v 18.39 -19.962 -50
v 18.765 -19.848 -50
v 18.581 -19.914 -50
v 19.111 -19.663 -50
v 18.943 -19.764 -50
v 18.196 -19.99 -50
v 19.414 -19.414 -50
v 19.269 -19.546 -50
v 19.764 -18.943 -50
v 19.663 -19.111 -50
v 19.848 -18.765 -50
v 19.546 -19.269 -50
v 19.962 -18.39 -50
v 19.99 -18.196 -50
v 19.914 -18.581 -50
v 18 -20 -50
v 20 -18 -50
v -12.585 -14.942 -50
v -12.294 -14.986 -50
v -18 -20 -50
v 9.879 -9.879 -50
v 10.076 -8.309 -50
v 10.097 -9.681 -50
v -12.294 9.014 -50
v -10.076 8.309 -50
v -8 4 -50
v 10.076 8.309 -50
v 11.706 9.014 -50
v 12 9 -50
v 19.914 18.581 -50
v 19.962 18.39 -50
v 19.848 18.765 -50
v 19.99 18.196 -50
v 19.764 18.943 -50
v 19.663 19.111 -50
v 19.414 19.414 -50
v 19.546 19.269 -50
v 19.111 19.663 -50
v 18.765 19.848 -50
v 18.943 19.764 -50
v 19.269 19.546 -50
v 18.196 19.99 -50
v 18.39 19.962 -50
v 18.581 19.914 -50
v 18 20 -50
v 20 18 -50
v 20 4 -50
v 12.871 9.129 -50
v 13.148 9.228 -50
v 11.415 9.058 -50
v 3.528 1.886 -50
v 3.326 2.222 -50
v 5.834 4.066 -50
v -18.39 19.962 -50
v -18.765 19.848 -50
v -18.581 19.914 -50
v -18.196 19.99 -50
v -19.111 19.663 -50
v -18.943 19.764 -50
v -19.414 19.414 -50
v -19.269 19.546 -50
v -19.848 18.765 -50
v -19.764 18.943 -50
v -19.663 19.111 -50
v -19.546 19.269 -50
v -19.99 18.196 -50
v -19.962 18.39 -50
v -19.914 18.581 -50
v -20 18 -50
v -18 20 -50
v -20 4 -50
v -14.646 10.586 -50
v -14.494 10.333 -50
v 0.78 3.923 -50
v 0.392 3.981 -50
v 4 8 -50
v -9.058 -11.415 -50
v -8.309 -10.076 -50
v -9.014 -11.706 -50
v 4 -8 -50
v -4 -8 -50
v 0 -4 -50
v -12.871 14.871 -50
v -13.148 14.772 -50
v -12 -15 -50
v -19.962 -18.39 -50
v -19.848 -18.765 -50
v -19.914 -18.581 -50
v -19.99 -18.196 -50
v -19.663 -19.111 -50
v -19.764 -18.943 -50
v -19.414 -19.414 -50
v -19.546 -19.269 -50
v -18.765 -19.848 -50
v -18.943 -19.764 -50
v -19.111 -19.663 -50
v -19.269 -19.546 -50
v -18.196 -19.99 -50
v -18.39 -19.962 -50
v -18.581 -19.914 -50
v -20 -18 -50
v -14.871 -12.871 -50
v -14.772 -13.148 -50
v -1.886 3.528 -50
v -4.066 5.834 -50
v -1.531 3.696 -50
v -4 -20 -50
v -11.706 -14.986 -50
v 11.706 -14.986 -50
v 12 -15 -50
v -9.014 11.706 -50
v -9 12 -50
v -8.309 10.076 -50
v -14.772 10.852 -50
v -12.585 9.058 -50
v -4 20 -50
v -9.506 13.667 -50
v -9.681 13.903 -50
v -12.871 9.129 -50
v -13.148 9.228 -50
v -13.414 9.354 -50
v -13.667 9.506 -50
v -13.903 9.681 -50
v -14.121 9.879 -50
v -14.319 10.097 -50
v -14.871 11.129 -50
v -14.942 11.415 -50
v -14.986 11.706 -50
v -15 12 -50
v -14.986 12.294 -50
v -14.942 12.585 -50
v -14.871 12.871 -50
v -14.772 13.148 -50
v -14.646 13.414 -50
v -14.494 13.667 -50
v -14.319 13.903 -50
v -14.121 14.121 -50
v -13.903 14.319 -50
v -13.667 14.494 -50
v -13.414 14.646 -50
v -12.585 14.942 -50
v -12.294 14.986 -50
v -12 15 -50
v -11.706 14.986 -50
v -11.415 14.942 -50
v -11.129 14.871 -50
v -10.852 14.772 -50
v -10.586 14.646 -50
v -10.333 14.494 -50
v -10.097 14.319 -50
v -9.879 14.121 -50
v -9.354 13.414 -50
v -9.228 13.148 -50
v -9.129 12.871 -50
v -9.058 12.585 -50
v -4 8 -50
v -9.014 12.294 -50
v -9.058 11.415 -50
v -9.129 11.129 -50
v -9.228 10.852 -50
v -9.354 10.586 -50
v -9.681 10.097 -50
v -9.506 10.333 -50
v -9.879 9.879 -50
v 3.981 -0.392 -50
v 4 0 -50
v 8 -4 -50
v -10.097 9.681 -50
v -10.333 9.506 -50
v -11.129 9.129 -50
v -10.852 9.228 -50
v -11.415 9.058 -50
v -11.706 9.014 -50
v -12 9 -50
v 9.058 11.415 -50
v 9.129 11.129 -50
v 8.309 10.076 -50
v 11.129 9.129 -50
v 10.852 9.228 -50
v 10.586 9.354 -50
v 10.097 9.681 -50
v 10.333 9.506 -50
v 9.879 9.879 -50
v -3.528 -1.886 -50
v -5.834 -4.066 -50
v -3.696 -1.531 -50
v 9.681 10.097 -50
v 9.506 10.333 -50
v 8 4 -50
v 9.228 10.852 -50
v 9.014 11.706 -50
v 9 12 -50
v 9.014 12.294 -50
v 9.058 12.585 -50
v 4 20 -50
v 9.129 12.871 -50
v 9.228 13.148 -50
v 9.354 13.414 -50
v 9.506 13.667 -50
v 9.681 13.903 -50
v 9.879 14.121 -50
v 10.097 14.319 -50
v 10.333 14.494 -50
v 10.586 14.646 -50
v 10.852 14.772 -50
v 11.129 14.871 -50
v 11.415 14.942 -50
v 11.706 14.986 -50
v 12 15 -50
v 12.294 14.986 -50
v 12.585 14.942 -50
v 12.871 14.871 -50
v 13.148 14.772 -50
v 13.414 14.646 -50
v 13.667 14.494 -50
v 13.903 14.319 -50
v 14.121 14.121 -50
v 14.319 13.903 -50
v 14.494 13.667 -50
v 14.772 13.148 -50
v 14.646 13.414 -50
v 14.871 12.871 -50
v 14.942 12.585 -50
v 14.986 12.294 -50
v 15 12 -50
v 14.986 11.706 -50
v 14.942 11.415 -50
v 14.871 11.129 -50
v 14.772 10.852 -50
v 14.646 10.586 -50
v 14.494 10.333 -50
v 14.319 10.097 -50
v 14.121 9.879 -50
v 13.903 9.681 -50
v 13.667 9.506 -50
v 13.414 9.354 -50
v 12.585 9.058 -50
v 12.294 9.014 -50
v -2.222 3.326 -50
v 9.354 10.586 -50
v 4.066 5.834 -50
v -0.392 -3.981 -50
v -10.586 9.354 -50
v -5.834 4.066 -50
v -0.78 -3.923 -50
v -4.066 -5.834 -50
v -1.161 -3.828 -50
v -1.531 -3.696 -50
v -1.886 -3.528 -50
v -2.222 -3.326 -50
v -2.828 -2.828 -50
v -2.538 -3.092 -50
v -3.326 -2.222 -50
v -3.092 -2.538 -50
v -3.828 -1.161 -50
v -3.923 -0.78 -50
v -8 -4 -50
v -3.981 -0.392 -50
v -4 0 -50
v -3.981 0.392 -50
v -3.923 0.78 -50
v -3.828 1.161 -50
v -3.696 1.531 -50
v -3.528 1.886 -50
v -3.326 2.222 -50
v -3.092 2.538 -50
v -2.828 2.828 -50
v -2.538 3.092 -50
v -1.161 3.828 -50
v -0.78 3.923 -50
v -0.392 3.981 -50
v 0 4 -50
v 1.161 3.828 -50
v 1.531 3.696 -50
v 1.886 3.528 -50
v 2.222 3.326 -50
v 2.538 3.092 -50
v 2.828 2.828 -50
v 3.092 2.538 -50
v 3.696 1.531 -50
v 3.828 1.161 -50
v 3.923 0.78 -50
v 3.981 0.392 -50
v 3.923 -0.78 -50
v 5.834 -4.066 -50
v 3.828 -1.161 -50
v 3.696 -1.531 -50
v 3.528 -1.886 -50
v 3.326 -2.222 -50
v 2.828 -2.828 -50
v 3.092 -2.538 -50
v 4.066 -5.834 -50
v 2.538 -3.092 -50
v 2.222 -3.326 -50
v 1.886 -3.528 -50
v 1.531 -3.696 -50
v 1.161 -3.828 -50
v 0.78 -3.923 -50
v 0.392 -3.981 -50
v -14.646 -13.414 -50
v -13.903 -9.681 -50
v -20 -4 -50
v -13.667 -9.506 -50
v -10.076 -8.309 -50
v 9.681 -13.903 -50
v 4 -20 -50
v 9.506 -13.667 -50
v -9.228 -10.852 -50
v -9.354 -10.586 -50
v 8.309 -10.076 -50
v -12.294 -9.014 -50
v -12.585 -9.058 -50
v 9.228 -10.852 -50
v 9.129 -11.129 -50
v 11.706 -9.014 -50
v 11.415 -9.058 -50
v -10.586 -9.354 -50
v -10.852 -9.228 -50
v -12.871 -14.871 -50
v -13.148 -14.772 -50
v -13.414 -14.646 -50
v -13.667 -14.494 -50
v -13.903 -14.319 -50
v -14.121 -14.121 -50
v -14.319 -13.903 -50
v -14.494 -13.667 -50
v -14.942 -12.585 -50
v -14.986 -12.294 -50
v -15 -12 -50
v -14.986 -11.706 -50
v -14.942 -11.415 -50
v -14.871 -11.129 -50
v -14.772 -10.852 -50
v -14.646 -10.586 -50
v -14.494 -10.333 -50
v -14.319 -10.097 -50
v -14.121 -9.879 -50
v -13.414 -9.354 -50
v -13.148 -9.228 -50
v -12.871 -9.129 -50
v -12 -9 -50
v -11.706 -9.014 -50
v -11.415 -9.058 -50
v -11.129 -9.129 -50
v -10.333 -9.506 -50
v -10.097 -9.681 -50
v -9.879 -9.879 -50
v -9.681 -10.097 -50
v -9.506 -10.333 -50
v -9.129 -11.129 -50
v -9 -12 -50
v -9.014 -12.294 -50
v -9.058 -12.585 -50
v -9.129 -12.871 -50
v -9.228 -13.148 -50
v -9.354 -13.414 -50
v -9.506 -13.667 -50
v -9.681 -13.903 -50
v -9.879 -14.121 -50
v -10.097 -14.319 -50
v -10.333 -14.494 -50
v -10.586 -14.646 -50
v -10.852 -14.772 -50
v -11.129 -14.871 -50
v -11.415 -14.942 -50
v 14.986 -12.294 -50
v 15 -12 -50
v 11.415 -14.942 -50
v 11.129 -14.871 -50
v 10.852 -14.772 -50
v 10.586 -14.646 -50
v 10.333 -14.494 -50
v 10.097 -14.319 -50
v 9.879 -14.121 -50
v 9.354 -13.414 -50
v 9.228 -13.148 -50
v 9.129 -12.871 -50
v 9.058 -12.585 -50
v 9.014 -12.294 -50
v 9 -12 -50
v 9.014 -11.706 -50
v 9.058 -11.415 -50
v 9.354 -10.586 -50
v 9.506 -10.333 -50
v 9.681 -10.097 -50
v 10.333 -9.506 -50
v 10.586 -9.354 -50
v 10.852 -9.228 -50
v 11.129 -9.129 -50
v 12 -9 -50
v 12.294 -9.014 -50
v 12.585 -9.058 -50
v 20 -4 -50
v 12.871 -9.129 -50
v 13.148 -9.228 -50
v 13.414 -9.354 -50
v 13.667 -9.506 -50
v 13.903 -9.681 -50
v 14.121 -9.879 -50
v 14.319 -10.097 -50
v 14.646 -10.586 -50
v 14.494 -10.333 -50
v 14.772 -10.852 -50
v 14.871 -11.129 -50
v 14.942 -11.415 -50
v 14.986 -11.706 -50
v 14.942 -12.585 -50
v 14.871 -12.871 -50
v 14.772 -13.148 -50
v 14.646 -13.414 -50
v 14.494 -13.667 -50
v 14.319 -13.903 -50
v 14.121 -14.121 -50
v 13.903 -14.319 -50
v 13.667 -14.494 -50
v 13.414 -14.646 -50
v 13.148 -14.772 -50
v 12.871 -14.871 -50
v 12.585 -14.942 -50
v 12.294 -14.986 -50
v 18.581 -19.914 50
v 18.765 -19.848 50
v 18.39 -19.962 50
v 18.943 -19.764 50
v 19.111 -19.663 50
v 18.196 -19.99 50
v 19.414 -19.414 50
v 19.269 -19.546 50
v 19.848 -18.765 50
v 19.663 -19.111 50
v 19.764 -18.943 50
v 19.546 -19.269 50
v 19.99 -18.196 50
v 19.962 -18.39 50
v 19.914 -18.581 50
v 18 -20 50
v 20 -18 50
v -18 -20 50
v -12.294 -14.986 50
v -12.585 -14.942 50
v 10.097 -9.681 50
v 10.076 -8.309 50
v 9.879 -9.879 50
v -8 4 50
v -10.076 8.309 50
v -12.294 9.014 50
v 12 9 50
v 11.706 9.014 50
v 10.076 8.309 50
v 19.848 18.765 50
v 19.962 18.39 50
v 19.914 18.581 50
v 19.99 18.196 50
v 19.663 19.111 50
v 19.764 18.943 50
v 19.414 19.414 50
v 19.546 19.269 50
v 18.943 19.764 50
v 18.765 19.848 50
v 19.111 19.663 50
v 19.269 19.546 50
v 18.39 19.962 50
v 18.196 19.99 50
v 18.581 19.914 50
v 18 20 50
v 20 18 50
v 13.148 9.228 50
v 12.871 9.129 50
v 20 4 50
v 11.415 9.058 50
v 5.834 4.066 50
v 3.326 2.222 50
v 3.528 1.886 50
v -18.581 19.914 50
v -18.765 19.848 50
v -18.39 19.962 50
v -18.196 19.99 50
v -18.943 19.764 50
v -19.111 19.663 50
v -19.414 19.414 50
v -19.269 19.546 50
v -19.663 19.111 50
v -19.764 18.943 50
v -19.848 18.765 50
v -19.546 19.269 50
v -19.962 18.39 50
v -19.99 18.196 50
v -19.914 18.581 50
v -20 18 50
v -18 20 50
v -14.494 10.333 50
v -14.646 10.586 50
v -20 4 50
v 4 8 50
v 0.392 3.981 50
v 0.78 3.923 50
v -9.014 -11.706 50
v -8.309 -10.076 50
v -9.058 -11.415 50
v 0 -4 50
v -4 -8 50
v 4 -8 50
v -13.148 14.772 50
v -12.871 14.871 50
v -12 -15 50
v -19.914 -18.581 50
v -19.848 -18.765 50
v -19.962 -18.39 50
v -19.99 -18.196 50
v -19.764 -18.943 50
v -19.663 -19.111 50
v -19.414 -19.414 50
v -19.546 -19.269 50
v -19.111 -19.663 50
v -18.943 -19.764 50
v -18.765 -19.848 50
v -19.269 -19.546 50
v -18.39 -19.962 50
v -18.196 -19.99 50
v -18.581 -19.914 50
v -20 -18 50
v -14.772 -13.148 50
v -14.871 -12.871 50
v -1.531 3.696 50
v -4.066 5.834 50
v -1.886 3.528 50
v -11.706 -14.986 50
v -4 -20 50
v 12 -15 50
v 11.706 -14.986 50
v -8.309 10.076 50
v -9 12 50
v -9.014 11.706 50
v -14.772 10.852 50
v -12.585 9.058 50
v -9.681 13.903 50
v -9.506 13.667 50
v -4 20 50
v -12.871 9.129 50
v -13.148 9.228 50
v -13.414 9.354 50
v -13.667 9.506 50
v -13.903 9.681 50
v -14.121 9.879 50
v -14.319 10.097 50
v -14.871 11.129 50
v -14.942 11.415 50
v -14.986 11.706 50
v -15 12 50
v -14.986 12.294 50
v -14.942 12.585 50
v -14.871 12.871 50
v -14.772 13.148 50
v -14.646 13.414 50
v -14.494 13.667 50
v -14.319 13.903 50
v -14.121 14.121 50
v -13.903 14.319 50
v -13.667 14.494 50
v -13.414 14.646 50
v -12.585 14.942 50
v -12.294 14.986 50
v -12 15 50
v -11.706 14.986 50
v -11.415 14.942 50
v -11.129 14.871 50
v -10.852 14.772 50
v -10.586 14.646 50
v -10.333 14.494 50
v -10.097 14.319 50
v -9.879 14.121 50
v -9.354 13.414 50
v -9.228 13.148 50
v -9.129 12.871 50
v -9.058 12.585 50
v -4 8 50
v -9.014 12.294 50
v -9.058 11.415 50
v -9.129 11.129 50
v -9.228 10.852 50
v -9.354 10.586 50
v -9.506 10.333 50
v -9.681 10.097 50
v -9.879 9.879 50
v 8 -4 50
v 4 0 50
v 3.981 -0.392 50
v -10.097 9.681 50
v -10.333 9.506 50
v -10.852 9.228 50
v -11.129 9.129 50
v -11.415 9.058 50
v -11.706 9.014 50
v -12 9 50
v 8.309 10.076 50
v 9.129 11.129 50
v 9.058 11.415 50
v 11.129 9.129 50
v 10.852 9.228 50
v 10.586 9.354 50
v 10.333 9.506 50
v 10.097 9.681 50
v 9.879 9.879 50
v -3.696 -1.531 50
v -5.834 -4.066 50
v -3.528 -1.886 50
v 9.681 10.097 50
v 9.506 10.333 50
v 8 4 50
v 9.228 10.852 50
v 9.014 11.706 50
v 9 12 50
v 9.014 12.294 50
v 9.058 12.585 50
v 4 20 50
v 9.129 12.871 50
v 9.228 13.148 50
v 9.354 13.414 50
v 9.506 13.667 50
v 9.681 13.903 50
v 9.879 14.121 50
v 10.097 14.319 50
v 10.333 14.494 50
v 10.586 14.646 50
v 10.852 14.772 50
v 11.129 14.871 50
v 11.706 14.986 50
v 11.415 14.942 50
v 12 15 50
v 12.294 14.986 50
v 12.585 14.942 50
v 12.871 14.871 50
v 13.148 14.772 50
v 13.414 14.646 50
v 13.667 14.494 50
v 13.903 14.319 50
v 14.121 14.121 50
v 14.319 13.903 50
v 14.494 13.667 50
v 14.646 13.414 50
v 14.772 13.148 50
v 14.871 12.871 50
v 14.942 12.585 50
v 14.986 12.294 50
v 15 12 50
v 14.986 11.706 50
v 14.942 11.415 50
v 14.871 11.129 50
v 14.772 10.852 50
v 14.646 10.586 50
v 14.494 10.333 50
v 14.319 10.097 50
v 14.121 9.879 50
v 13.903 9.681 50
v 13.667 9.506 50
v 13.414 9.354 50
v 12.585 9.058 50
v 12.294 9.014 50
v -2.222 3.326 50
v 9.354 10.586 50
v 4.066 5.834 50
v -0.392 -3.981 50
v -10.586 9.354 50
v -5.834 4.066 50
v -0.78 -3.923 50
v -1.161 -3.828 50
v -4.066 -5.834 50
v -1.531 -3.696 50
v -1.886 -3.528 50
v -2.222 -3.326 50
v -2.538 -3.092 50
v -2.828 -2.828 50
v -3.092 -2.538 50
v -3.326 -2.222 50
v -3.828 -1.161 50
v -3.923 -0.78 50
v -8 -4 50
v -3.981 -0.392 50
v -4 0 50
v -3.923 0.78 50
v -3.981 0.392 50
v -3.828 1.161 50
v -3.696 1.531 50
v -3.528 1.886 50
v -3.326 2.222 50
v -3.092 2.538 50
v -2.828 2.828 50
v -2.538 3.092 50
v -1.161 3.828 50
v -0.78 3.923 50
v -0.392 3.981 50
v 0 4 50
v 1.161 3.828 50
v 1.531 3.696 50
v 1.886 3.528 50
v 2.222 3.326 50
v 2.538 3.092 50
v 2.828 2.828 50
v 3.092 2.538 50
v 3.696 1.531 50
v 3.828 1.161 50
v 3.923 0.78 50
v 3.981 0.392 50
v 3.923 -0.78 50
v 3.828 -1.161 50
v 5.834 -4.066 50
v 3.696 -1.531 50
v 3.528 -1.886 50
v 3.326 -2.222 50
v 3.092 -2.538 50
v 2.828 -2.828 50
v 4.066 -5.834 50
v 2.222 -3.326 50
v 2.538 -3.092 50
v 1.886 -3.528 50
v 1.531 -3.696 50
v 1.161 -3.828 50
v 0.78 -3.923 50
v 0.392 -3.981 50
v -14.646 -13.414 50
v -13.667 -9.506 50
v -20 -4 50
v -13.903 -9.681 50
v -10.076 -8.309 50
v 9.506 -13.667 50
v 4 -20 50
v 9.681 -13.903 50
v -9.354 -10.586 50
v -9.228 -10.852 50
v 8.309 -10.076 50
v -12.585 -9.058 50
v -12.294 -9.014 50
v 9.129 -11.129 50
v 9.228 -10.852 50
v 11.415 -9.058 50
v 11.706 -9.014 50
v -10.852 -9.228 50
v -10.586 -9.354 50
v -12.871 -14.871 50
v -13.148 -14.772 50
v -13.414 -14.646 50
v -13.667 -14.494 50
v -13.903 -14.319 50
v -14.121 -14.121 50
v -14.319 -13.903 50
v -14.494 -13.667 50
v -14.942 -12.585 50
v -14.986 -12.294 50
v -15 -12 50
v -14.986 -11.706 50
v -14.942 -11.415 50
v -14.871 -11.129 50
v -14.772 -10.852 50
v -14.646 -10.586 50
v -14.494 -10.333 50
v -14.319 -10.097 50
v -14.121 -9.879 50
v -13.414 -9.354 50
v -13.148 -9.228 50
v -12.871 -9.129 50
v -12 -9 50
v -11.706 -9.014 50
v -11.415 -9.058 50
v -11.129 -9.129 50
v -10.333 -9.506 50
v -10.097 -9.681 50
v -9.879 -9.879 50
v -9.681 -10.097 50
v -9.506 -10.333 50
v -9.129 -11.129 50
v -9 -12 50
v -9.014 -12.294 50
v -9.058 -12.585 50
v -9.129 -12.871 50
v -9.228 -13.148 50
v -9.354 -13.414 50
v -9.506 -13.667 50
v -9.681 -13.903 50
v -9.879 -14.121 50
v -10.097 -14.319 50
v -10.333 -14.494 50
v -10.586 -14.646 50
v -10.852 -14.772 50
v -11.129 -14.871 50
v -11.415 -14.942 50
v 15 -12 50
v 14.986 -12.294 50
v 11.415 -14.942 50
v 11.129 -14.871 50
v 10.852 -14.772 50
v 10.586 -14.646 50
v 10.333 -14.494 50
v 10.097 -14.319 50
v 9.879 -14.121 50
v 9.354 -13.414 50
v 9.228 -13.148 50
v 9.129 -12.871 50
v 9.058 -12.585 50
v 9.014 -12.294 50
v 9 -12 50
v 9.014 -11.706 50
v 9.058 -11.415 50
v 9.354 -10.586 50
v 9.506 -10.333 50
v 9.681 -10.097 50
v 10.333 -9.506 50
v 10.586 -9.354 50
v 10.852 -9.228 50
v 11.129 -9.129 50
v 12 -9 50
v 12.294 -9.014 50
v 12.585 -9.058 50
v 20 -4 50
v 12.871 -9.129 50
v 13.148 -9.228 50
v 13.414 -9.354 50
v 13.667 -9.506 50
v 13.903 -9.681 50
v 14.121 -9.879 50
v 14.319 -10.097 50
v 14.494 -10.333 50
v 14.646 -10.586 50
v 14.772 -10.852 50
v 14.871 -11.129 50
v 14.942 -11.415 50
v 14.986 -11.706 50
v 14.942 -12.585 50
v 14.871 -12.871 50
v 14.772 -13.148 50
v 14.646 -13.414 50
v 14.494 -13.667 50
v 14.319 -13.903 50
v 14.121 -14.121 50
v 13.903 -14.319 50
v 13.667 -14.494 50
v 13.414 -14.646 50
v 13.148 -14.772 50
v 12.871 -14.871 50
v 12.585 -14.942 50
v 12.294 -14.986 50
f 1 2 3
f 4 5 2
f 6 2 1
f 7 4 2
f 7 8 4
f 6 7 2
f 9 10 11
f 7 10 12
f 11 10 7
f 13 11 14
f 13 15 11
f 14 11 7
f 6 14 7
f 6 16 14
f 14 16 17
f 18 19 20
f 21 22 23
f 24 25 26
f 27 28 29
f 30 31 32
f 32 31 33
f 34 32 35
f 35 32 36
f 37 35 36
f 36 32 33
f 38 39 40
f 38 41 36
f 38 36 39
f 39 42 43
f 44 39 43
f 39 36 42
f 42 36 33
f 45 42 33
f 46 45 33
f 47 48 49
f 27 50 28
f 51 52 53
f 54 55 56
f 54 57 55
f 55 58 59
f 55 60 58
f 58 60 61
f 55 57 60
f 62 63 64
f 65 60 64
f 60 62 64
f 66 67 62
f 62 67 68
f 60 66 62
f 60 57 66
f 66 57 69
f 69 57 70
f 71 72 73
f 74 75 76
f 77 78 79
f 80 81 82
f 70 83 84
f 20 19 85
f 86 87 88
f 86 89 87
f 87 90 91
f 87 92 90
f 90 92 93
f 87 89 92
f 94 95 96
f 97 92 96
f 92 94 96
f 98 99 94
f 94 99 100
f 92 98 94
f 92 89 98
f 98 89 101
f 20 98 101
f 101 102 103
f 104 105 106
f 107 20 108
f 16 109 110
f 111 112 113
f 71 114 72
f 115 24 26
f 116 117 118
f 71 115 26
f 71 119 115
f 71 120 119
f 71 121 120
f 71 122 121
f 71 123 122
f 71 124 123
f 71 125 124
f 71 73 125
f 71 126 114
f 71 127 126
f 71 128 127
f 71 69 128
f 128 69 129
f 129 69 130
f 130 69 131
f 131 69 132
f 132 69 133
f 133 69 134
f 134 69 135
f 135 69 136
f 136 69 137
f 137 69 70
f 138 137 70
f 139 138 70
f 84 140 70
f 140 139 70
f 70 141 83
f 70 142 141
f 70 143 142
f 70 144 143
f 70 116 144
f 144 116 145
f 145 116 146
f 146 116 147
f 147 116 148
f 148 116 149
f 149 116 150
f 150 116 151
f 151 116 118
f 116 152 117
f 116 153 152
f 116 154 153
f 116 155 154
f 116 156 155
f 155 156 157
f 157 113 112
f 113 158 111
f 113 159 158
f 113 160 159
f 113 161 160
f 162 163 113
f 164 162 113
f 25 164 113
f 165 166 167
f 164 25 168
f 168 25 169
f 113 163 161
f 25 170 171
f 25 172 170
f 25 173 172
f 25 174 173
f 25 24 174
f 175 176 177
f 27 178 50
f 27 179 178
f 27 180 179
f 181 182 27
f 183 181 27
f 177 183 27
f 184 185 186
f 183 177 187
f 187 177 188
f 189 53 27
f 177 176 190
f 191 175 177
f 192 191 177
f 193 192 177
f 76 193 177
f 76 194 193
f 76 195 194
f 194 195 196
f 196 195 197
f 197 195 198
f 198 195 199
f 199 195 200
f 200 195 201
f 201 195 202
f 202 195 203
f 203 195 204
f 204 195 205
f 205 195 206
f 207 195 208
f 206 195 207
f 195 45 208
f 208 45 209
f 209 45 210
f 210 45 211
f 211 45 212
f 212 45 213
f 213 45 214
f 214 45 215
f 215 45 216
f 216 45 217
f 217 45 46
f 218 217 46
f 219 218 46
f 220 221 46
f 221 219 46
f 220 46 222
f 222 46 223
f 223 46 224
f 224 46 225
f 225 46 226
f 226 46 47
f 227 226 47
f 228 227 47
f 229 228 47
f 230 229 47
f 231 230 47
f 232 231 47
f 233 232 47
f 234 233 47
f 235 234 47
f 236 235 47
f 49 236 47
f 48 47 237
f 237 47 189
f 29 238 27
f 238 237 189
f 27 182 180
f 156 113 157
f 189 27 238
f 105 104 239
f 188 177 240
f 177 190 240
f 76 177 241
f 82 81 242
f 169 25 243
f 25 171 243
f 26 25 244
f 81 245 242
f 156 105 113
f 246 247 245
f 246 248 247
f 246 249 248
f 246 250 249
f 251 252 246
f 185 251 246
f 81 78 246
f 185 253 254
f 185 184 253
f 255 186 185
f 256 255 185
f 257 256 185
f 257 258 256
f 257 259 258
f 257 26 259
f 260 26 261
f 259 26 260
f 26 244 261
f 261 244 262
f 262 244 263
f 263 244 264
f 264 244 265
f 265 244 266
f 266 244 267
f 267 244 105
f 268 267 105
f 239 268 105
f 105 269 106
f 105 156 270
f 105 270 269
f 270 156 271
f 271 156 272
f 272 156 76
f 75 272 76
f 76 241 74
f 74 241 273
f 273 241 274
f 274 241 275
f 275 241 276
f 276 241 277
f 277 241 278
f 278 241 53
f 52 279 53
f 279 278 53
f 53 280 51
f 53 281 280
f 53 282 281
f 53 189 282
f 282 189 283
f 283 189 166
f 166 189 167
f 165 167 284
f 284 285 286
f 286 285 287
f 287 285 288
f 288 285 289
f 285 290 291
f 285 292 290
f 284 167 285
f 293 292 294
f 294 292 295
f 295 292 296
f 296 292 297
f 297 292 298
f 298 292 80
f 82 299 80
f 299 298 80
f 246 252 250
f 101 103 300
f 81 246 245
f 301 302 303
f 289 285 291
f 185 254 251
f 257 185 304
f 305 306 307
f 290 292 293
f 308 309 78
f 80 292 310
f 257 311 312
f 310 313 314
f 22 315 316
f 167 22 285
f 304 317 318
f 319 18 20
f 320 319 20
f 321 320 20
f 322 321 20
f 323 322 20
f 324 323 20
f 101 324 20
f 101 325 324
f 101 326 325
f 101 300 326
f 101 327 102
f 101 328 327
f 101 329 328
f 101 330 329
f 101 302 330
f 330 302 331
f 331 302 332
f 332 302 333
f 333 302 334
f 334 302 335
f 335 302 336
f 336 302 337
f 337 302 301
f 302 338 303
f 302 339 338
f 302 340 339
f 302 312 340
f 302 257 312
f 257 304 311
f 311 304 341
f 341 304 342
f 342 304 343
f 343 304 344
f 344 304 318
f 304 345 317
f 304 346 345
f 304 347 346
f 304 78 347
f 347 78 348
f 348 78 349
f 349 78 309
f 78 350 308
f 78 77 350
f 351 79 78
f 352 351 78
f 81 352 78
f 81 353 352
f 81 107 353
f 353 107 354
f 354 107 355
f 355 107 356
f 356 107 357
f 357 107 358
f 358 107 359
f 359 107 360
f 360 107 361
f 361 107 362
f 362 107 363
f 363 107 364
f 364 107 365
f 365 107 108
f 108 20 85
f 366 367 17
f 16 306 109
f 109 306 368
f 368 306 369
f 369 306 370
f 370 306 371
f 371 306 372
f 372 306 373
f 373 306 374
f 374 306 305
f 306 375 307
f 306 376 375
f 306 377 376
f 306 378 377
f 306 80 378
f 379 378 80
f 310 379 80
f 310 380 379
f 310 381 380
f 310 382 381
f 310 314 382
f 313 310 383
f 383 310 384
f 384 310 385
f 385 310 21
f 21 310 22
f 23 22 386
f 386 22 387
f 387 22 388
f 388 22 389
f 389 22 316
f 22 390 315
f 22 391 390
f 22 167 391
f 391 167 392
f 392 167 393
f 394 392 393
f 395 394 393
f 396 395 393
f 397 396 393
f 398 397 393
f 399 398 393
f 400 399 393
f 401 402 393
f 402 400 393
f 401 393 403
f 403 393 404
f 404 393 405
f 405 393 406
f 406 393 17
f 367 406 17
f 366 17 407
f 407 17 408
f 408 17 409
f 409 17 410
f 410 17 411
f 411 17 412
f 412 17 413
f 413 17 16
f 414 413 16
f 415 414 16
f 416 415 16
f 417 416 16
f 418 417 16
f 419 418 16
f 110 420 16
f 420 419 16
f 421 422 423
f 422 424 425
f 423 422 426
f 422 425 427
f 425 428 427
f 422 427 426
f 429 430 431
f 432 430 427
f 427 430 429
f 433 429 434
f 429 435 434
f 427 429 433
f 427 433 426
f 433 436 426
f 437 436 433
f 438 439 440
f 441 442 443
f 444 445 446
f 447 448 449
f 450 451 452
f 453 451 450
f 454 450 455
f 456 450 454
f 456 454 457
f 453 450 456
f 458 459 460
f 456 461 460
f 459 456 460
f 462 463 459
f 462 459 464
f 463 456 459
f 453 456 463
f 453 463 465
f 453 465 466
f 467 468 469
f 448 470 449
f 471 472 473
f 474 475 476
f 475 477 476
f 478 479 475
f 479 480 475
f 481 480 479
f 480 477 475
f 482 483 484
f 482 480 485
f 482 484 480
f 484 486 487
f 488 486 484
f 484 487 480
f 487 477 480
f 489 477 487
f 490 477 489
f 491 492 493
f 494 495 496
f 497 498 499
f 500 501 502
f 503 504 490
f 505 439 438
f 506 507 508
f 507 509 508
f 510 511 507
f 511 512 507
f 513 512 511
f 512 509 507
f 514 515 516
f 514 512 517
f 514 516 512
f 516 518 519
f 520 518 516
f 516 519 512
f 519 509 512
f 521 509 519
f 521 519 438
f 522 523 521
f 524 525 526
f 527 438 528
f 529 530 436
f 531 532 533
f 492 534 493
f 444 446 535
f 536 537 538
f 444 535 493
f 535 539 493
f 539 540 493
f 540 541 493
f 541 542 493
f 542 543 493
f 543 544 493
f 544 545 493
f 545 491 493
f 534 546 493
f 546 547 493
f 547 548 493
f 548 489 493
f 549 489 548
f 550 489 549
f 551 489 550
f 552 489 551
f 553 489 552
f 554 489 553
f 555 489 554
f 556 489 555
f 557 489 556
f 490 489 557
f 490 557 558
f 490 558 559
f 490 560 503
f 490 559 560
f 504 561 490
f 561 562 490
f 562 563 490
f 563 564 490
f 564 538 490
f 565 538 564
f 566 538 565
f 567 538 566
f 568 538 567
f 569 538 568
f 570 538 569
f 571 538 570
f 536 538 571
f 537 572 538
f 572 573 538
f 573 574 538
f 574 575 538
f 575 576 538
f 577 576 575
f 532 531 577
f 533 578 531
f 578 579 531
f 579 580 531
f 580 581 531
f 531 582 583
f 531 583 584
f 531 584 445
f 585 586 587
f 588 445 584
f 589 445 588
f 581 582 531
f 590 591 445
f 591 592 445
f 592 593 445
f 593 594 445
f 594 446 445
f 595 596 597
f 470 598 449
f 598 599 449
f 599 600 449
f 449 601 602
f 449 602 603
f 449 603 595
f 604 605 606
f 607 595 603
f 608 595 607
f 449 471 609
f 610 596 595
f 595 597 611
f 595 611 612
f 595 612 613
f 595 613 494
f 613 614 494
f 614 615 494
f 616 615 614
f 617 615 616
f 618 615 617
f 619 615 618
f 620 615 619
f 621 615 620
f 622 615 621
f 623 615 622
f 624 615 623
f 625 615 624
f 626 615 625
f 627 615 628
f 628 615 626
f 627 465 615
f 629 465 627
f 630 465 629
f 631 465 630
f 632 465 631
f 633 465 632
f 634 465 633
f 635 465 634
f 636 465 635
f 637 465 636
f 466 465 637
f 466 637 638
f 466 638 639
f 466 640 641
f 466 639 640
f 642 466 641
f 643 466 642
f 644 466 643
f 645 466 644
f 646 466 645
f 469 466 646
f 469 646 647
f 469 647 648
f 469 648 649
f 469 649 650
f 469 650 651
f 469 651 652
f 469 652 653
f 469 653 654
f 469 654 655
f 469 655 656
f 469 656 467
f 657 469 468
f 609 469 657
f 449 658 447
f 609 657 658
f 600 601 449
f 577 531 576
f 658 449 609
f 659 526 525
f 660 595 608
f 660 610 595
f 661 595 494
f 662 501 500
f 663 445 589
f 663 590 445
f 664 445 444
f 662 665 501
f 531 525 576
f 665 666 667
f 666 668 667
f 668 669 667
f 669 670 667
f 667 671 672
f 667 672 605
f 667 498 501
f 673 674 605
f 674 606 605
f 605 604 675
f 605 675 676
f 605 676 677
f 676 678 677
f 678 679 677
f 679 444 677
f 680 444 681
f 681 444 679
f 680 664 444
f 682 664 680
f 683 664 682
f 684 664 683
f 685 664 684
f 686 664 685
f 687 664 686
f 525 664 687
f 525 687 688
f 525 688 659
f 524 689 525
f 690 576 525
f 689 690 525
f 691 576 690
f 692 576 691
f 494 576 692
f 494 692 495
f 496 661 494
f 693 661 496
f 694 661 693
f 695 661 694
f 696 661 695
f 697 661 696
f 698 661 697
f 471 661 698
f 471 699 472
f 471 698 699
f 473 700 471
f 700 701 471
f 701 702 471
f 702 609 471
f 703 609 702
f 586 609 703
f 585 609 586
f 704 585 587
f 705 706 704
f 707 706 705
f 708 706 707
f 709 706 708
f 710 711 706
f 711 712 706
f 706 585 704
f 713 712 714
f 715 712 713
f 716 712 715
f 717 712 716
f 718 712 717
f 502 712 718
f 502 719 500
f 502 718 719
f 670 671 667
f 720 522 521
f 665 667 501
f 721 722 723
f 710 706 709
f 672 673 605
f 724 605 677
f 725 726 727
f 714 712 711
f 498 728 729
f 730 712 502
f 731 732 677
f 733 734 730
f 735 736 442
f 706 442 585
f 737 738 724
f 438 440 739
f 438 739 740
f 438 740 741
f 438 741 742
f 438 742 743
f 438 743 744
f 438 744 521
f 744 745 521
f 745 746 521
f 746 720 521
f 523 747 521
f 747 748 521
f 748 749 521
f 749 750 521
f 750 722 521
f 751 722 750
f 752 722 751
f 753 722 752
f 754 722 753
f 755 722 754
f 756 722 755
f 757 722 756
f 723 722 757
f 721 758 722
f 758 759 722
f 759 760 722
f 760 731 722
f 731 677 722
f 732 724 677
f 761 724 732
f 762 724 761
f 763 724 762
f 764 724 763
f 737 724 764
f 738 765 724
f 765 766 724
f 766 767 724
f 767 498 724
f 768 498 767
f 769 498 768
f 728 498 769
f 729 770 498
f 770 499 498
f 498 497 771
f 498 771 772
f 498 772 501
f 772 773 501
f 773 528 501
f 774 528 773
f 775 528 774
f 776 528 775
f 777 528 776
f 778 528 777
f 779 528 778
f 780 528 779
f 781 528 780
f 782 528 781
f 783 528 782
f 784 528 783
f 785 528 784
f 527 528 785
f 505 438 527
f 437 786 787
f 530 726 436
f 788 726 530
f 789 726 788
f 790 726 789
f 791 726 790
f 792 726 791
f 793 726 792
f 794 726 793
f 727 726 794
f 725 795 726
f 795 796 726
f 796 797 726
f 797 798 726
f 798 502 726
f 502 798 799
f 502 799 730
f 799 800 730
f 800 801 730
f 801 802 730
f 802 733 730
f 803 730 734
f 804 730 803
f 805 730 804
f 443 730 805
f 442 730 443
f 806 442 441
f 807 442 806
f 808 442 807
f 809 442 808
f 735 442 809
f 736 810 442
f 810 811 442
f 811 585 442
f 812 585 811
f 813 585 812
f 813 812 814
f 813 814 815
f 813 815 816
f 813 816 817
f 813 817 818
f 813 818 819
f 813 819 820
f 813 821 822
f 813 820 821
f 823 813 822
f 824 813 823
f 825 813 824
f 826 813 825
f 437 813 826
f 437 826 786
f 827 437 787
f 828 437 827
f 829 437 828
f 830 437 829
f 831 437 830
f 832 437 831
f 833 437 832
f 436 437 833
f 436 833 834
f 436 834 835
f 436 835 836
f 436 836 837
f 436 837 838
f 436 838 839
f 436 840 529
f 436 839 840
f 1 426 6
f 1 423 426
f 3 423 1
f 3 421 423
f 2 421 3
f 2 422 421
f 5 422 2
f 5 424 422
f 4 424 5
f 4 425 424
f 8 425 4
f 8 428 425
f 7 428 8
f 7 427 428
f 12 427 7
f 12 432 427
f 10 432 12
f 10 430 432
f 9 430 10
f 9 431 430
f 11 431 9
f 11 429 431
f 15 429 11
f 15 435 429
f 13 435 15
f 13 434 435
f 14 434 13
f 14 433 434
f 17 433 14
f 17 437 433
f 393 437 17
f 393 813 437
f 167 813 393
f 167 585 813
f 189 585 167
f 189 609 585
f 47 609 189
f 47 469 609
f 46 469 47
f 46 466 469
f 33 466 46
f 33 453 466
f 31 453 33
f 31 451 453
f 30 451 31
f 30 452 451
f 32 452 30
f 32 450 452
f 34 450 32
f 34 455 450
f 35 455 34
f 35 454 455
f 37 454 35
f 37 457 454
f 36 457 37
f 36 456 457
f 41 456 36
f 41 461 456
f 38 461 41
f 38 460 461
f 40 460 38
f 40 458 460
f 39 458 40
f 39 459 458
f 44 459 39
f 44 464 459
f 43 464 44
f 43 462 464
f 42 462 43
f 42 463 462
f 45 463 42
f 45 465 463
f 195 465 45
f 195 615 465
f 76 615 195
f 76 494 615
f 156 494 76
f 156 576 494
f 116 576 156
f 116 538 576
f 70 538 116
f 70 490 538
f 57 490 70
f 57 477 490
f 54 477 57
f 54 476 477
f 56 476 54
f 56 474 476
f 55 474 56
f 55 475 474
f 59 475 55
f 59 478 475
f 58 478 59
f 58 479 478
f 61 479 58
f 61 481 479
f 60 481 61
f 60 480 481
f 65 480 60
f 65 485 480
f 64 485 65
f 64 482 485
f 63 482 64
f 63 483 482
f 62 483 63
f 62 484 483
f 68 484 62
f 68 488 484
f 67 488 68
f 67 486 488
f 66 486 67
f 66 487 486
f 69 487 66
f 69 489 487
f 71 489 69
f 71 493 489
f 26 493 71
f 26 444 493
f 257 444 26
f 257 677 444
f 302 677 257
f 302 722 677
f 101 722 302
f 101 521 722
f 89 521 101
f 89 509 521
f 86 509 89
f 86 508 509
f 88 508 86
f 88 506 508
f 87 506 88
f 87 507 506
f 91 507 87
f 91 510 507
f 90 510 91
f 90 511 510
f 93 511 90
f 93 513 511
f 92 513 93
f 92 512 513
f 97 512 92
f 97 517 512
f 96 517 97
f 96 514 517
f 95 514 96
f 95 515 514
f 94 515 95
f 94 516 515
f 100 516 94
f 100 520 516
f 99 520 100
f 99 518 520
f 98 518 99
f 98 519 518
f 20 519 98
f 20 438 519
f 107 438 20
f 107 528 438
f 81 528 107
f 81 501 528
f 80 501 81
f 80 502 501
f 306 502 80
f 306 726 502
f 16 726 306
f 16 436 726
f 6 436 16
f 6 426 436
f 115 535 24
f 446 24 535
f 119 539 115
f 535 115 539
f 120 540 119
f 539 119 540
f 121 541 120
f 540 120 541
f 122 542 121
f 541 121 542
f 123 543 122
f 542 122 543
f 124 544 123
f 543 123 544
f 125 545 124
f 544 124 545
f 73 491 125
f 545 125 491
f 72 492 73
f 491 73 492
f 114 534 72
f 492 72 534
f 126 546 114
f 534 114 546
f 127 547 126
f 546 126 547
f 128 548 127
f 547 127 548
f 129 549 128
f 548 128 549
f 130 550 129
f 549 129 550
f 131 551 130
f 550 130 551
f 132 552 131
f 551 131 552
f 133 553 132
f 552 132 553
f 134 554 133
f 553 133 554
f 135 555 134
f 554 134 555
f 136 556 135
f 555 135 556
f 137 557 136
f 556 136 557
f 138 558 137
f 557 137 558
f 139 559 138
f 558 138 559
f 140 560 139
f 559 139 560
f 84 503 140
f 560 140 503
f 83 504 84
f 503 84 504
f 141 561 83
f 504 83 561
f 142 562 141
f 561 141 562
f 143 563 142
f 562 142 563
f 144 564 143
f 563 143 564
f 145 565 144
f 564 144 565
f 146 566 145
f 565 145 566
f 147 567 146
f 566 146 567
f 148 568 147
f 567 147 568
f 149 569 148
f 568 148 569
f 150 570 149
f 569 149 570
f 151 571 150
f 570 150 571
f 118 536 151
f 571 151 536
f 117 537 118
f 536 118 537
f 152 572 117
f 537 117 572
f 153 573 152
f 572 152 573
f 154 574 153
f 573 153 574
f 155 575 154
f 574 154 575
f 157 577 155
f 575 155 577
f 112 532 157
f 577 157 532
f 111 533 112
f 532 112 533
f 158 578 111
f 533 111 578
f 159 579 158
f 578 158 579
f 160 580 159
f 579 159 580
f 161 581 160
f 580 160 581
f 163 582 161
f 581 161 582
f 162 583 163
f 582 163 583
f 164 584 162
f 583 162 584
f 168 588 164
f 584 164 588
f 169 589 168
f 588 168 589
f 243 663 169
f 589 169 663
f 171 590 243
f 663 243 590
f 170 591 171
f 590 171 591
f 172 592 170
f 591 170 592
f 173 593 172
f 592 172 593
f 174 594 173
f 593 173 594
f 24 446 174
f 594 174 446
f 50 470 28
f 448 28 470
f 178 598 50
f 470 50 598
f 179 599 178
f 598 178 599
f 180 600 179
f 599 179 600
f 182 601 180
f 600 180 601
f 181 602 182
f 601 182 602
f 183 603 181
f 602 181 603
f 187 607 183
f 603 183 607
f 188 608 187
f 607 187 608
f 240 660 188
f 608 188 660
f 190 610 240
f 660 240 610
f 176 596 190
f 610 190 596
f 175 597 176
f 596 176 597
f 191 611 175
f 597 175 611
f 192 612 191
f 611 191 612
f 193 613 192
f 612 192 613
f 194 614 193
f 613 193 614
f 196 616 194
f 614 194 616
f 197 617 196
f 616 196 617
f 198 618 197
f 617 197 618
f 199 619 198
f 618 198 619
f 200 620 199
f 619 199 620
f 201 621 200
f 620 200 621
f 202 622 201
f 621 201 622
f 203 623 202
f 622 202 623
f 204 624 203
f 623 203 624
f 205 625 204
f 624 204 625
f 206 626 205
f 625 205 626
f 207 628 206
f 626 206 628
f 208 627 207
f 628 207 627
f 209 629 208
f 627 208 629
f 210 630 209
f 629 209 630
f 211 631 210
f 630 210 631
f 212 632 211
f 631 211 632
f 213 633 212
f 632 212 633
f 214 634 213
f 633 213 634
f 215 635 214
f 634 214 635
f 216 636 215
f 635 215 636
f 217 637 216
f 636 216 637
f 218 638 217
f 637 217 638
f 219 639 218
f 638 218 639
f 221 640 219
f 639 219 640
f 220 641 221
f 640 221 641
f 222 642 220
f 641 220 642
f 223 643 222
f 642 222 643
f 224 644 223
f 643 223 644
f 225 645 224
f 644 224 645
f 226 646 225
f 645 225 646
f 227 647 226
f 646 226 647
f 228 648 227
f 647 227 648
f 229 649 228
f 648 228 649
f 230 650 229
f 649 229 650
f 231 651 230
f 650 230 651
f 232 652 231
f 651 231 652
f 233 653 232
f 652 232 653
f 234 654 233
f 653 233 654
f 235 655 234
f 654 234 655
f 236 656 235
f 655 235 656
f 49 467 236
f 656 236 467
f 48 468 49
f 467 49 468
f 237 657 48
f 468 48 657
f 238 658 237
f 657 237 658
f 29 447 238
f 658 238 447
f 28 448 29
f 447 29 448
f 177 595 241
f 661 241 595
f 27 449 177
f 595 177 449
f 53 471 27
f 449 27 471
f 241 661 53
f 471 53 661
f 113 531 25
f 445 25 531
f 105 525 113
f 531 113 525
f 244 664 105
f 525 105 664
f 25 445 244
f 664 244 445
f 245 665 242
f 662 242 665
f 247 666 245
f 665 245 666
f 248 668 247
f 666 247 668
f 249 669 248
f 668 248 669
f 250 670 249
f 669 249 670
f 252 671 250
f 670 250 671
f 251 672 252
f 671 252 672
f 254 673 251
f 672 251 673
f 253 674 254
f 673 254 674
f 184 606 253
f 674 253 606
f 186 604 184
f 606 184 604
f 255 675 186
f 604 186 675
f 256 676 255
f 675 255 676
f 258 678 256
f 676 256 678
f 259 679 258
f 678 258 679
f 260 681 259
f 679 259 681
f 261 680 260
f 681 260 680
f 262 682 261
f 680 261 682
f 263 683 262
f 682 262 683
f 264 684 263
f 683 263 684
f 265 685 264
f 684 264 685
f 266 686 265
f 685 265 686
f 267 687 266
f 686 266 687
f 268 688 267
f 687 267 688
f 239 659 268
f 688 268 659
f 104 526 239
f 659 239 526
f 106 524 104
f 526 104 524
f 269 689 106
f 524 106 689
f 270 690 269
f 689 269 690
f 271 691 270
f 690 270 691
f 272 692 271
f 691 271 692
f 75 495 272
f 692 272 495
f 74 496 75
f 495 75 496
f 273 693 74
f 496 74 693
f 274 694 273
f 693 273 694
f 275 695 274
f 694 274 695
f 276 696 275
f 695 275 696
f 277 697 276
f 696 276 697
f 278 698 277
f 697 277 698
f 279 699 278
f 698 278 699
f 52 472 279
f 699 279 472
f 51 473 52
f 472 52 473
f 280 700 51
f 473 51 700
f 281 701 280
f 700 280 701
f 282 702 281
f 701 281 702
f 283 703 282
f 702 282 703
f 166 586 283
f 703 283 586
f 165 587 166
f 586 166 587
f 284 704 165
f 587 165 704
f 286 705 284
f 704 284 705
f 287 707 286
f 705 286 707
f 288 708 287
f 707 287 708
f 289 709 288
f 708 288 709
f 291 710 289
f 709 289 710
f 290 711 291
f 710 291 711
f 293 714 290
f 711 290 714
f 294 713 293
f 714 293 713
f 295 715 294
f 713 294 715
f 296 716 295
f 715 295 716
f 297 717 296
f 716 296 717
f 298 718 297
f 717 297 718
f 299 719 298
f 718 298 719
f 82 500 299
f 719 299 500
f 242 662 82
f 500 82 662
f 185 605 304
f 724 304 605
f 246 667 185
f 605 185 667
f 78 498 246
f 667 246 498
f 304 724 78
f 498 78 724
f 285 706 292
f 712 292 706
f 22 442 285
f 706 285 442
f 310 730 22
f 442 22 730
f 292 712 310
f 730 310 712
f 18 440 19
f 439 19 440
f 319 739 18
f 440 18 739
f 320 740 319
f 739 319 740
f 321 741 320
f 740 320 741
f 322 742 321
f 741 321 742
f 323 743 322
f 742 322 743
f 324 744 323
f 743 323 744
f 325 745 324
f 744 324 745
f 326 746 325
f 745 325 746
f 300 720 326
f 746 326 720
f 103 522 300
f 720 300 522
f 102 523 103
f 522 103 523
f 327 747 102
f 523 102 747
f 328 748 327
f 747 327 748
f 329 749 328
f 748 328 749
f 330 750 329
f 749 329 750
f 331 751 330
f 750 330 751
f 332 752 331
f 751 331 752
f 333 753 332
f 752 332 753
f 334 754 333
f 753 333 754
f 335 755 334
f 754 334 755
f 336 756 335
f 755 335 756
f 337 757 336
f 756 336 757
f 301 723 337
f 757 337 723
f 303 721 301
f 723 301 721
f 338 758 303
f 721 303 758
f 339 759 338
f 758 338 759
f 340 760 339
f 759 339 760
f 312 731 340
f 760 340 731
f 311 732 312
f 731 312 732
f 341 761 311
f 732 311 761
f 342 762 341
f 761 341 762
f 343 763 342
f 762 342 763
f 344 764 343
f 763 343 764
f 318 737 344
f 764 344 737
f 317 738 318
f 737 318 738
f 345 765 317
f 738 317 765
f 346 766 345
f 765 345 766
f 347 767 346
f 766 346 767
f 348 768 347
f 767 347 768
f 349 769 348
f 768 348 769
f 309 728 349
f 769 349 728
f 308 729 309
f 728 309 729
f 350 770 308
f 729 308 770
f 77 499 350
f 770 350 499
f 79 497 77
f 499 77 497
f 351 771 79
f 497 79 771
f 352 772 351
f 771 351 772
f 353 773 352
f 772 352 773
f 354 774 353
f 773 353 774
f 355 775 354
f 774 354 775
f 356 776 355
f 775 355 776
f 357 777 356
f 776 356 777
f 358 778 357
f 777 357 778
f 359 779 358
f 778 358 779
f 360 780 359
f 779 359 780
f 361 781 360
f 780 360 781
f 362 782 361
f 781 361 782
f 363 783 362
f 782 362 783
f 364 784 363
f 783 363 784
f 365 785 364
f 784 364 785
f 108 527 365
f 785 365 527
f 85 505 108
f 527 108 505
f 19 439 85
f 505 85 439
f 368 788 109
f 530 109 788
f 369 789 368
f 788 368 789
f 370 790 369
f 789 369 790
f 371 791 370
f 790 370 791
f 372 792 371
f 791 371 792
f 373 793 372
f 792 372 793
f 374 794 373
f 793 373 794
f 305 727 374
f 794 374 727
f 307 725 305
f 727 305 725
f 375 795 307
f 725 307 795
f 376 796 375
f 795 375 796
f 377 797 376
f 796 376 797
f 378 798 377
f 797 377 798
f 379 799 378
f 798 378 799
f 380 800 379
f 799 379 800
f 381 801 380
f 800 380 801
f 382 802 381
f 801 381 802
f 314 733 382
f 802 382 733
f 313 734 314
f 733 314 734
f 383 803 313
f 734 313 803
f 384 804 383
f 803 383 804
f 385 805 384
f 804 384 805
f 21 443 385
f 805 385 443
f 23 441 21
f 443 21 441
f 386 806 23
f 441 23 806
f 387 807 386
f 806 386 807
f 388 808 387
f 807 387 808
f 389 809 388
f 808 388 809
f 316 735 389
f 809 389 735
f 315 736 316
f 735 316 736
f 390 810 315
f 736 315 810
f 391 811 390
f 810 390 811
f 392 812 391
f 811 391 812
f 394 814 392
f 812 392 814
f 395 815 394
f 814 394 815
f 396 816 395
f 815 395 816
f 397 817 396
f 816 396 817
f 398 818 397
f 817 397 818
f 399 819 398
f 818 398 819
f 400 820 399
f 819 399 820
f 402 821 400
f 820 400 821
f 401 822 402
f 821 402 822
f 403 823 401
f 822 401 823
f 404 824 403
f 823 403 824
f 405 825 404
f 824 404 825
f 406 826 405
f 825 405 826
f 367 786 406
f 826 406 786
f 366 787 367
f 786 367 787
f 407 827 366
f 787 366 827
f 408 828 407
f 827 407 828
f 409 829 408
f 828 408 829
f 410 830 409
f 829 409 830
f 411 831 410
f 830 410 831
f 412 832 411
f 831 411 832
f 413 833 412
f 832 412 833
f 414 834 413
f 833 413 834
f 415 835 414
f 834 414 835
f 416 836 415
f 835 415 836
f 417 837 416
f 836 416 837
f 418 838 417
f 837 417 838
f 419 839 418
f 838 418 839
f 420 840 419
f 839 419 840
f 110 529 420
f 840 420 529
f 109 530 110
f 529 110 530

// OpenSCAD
// 40x40 aluminum extrusion (generic 8mm-slot style), 100mm long
// Single connected solid only (no floating helper parts)

$fn = 64;

// Parameters (kept, but defaulted to requested target)
cross_section_width_mm  = 40.0;
cross_section_height_mm = 40.0;
length_mm              = 100.0;

// Profile details (typical-ish for 40-series)
slot_opening_mm        = 8.0;   // mouth opening at the outer face
slot_depth_mm          = 12.0;  // how far slot cavity goes inward from outer face
slot_neck_mm           = 4.0;   // narrow neck inside the slot
center_bore_diameter_mm= 8.0;   // center through-bore
corner_fillet_radius_mm= 2.0;   // outer corner rounding (approx)
overlap_mm             = 0.2;   // small overlap for robust boolean ops

// Derived
w = cross_section_width_mm;
h = cross_section_height_mm;
L = length_mm;

module rounded_rect_2d(w, h, r) {
    r2 = min(r, min(w, h)/2);
    hull() {
        translate([ w/2 - r2,  h/2 - r2]) circle(r=r2);
        translate([-w/2 + r2,  h/2 - r2]) circle(r=r2);
        translate([ w/2 - r2, -h/2 + r2]) circle(r=r2);
        translate([-w/2 + r2, -h/2 + r2]) circle(r=r2);
    }
}

// 2D cross-section of the extrusion (to be linearly extruded)
module extrusion_cross_section_2d() {
    // Keep everything formula-based and symmetric
    outer_r = corner_fillet_radius_mm;

    // Slot geometry (2D)
    mouth_w = slot_opening_mm;
    neck_w  = slot_neck_mm;

    // Ensure slot depth doesn't exceed half-width
    sd = min(slot_depth_mm, min(w, h)/2 - 1);

    // Place slot so its outer edge is flush with the outer face, with a tiny overlap
    // Outer face at +w/2 (or +h/2). Slot rectangle center is at:
    // x = +w/2 - sd/2 + overlap
    slot_center = (w/2 - sd/2 + overlap_mm);

    // Neck is slightly more inward than the mouth cavity
    neck_depth = sd * 0.55;
    neck_center = (w/2 - neck_depth/2 + overlap_mm);

    // Internal voids to make it look like a real extrusion (lightweight approximation)
    // Four inner pockets near corners
    pocket_inset = 8.0;
    pocket_r = 3.0;

    difference() {
        // Outer boundary
        rounded_rect_2d(w, h, outer_r);

        // Center bore
        circle(d = center_bore_diameter_mm);

        // Four T-slots (subtract)
        union() {
            // +X slot
            translate([ slot_center, 0])
                square([sd + 2*overlap_mm, mouth_w], center=true);
            translate([ neck_center, 0])
                square([neck_depth + 2*overlap_mm, neck_w], center=true);

            // -X slot
            translate([-slot_center, 0])
                square([sd + 2*overlap_mm, mouth_w], center=true);
            translate([-neck_center, 0])
                square([neck_depth + 2*overlap_mm, neck_w], center=true);

            // +Y slot
            translate([0, slot_center])
                square([mouth_w, sd + 2*overlap_mm], center=true);
            translate([0, neck_center])
                square([neck_w, neck_depth + 2*overlap_mm], center=true);

            // -Y slot
            translate([0, -slot_center])
                square([mouth_w, sd + 2*overlap_mm], center=true);
            translate([0, -neck_center])
                square([neck_w, neck_depth + 2*overlap_mm], center=true);
        }

        // Inner corner pockets (subtract) to avoid a "solid block" look
        // Positioned by formulas from dimensions
        for (sx = [-1, 1], sy = [-1, 1]) {
            translate([sx*(w/2 - pocket_inset), sy*(h/2 - pocket_inset)])
                circle(r=pocket_r);
        }

        // Small diagonal reliefs (subtract) to hint at internal webs
        // (kept subtle so the body remains one connected solid)
        relief_w = 6.0;
        relief_h = 2.5;
        relief_off = 10.0;
        for (a = [45, 135, 225, 315]) {
            rotate(a)
                translate([relief_off, 0])
                    square([relief_w, relief_h], center=true);
        }
    }
}

module extrusion_40x40_L() {
    color("Silver")
        linear_extrude(height=L, center=true, convexity=10)
            extrusion_cross_section_2d();
}

// Single connected solid output
extrusion_40x40_L();
